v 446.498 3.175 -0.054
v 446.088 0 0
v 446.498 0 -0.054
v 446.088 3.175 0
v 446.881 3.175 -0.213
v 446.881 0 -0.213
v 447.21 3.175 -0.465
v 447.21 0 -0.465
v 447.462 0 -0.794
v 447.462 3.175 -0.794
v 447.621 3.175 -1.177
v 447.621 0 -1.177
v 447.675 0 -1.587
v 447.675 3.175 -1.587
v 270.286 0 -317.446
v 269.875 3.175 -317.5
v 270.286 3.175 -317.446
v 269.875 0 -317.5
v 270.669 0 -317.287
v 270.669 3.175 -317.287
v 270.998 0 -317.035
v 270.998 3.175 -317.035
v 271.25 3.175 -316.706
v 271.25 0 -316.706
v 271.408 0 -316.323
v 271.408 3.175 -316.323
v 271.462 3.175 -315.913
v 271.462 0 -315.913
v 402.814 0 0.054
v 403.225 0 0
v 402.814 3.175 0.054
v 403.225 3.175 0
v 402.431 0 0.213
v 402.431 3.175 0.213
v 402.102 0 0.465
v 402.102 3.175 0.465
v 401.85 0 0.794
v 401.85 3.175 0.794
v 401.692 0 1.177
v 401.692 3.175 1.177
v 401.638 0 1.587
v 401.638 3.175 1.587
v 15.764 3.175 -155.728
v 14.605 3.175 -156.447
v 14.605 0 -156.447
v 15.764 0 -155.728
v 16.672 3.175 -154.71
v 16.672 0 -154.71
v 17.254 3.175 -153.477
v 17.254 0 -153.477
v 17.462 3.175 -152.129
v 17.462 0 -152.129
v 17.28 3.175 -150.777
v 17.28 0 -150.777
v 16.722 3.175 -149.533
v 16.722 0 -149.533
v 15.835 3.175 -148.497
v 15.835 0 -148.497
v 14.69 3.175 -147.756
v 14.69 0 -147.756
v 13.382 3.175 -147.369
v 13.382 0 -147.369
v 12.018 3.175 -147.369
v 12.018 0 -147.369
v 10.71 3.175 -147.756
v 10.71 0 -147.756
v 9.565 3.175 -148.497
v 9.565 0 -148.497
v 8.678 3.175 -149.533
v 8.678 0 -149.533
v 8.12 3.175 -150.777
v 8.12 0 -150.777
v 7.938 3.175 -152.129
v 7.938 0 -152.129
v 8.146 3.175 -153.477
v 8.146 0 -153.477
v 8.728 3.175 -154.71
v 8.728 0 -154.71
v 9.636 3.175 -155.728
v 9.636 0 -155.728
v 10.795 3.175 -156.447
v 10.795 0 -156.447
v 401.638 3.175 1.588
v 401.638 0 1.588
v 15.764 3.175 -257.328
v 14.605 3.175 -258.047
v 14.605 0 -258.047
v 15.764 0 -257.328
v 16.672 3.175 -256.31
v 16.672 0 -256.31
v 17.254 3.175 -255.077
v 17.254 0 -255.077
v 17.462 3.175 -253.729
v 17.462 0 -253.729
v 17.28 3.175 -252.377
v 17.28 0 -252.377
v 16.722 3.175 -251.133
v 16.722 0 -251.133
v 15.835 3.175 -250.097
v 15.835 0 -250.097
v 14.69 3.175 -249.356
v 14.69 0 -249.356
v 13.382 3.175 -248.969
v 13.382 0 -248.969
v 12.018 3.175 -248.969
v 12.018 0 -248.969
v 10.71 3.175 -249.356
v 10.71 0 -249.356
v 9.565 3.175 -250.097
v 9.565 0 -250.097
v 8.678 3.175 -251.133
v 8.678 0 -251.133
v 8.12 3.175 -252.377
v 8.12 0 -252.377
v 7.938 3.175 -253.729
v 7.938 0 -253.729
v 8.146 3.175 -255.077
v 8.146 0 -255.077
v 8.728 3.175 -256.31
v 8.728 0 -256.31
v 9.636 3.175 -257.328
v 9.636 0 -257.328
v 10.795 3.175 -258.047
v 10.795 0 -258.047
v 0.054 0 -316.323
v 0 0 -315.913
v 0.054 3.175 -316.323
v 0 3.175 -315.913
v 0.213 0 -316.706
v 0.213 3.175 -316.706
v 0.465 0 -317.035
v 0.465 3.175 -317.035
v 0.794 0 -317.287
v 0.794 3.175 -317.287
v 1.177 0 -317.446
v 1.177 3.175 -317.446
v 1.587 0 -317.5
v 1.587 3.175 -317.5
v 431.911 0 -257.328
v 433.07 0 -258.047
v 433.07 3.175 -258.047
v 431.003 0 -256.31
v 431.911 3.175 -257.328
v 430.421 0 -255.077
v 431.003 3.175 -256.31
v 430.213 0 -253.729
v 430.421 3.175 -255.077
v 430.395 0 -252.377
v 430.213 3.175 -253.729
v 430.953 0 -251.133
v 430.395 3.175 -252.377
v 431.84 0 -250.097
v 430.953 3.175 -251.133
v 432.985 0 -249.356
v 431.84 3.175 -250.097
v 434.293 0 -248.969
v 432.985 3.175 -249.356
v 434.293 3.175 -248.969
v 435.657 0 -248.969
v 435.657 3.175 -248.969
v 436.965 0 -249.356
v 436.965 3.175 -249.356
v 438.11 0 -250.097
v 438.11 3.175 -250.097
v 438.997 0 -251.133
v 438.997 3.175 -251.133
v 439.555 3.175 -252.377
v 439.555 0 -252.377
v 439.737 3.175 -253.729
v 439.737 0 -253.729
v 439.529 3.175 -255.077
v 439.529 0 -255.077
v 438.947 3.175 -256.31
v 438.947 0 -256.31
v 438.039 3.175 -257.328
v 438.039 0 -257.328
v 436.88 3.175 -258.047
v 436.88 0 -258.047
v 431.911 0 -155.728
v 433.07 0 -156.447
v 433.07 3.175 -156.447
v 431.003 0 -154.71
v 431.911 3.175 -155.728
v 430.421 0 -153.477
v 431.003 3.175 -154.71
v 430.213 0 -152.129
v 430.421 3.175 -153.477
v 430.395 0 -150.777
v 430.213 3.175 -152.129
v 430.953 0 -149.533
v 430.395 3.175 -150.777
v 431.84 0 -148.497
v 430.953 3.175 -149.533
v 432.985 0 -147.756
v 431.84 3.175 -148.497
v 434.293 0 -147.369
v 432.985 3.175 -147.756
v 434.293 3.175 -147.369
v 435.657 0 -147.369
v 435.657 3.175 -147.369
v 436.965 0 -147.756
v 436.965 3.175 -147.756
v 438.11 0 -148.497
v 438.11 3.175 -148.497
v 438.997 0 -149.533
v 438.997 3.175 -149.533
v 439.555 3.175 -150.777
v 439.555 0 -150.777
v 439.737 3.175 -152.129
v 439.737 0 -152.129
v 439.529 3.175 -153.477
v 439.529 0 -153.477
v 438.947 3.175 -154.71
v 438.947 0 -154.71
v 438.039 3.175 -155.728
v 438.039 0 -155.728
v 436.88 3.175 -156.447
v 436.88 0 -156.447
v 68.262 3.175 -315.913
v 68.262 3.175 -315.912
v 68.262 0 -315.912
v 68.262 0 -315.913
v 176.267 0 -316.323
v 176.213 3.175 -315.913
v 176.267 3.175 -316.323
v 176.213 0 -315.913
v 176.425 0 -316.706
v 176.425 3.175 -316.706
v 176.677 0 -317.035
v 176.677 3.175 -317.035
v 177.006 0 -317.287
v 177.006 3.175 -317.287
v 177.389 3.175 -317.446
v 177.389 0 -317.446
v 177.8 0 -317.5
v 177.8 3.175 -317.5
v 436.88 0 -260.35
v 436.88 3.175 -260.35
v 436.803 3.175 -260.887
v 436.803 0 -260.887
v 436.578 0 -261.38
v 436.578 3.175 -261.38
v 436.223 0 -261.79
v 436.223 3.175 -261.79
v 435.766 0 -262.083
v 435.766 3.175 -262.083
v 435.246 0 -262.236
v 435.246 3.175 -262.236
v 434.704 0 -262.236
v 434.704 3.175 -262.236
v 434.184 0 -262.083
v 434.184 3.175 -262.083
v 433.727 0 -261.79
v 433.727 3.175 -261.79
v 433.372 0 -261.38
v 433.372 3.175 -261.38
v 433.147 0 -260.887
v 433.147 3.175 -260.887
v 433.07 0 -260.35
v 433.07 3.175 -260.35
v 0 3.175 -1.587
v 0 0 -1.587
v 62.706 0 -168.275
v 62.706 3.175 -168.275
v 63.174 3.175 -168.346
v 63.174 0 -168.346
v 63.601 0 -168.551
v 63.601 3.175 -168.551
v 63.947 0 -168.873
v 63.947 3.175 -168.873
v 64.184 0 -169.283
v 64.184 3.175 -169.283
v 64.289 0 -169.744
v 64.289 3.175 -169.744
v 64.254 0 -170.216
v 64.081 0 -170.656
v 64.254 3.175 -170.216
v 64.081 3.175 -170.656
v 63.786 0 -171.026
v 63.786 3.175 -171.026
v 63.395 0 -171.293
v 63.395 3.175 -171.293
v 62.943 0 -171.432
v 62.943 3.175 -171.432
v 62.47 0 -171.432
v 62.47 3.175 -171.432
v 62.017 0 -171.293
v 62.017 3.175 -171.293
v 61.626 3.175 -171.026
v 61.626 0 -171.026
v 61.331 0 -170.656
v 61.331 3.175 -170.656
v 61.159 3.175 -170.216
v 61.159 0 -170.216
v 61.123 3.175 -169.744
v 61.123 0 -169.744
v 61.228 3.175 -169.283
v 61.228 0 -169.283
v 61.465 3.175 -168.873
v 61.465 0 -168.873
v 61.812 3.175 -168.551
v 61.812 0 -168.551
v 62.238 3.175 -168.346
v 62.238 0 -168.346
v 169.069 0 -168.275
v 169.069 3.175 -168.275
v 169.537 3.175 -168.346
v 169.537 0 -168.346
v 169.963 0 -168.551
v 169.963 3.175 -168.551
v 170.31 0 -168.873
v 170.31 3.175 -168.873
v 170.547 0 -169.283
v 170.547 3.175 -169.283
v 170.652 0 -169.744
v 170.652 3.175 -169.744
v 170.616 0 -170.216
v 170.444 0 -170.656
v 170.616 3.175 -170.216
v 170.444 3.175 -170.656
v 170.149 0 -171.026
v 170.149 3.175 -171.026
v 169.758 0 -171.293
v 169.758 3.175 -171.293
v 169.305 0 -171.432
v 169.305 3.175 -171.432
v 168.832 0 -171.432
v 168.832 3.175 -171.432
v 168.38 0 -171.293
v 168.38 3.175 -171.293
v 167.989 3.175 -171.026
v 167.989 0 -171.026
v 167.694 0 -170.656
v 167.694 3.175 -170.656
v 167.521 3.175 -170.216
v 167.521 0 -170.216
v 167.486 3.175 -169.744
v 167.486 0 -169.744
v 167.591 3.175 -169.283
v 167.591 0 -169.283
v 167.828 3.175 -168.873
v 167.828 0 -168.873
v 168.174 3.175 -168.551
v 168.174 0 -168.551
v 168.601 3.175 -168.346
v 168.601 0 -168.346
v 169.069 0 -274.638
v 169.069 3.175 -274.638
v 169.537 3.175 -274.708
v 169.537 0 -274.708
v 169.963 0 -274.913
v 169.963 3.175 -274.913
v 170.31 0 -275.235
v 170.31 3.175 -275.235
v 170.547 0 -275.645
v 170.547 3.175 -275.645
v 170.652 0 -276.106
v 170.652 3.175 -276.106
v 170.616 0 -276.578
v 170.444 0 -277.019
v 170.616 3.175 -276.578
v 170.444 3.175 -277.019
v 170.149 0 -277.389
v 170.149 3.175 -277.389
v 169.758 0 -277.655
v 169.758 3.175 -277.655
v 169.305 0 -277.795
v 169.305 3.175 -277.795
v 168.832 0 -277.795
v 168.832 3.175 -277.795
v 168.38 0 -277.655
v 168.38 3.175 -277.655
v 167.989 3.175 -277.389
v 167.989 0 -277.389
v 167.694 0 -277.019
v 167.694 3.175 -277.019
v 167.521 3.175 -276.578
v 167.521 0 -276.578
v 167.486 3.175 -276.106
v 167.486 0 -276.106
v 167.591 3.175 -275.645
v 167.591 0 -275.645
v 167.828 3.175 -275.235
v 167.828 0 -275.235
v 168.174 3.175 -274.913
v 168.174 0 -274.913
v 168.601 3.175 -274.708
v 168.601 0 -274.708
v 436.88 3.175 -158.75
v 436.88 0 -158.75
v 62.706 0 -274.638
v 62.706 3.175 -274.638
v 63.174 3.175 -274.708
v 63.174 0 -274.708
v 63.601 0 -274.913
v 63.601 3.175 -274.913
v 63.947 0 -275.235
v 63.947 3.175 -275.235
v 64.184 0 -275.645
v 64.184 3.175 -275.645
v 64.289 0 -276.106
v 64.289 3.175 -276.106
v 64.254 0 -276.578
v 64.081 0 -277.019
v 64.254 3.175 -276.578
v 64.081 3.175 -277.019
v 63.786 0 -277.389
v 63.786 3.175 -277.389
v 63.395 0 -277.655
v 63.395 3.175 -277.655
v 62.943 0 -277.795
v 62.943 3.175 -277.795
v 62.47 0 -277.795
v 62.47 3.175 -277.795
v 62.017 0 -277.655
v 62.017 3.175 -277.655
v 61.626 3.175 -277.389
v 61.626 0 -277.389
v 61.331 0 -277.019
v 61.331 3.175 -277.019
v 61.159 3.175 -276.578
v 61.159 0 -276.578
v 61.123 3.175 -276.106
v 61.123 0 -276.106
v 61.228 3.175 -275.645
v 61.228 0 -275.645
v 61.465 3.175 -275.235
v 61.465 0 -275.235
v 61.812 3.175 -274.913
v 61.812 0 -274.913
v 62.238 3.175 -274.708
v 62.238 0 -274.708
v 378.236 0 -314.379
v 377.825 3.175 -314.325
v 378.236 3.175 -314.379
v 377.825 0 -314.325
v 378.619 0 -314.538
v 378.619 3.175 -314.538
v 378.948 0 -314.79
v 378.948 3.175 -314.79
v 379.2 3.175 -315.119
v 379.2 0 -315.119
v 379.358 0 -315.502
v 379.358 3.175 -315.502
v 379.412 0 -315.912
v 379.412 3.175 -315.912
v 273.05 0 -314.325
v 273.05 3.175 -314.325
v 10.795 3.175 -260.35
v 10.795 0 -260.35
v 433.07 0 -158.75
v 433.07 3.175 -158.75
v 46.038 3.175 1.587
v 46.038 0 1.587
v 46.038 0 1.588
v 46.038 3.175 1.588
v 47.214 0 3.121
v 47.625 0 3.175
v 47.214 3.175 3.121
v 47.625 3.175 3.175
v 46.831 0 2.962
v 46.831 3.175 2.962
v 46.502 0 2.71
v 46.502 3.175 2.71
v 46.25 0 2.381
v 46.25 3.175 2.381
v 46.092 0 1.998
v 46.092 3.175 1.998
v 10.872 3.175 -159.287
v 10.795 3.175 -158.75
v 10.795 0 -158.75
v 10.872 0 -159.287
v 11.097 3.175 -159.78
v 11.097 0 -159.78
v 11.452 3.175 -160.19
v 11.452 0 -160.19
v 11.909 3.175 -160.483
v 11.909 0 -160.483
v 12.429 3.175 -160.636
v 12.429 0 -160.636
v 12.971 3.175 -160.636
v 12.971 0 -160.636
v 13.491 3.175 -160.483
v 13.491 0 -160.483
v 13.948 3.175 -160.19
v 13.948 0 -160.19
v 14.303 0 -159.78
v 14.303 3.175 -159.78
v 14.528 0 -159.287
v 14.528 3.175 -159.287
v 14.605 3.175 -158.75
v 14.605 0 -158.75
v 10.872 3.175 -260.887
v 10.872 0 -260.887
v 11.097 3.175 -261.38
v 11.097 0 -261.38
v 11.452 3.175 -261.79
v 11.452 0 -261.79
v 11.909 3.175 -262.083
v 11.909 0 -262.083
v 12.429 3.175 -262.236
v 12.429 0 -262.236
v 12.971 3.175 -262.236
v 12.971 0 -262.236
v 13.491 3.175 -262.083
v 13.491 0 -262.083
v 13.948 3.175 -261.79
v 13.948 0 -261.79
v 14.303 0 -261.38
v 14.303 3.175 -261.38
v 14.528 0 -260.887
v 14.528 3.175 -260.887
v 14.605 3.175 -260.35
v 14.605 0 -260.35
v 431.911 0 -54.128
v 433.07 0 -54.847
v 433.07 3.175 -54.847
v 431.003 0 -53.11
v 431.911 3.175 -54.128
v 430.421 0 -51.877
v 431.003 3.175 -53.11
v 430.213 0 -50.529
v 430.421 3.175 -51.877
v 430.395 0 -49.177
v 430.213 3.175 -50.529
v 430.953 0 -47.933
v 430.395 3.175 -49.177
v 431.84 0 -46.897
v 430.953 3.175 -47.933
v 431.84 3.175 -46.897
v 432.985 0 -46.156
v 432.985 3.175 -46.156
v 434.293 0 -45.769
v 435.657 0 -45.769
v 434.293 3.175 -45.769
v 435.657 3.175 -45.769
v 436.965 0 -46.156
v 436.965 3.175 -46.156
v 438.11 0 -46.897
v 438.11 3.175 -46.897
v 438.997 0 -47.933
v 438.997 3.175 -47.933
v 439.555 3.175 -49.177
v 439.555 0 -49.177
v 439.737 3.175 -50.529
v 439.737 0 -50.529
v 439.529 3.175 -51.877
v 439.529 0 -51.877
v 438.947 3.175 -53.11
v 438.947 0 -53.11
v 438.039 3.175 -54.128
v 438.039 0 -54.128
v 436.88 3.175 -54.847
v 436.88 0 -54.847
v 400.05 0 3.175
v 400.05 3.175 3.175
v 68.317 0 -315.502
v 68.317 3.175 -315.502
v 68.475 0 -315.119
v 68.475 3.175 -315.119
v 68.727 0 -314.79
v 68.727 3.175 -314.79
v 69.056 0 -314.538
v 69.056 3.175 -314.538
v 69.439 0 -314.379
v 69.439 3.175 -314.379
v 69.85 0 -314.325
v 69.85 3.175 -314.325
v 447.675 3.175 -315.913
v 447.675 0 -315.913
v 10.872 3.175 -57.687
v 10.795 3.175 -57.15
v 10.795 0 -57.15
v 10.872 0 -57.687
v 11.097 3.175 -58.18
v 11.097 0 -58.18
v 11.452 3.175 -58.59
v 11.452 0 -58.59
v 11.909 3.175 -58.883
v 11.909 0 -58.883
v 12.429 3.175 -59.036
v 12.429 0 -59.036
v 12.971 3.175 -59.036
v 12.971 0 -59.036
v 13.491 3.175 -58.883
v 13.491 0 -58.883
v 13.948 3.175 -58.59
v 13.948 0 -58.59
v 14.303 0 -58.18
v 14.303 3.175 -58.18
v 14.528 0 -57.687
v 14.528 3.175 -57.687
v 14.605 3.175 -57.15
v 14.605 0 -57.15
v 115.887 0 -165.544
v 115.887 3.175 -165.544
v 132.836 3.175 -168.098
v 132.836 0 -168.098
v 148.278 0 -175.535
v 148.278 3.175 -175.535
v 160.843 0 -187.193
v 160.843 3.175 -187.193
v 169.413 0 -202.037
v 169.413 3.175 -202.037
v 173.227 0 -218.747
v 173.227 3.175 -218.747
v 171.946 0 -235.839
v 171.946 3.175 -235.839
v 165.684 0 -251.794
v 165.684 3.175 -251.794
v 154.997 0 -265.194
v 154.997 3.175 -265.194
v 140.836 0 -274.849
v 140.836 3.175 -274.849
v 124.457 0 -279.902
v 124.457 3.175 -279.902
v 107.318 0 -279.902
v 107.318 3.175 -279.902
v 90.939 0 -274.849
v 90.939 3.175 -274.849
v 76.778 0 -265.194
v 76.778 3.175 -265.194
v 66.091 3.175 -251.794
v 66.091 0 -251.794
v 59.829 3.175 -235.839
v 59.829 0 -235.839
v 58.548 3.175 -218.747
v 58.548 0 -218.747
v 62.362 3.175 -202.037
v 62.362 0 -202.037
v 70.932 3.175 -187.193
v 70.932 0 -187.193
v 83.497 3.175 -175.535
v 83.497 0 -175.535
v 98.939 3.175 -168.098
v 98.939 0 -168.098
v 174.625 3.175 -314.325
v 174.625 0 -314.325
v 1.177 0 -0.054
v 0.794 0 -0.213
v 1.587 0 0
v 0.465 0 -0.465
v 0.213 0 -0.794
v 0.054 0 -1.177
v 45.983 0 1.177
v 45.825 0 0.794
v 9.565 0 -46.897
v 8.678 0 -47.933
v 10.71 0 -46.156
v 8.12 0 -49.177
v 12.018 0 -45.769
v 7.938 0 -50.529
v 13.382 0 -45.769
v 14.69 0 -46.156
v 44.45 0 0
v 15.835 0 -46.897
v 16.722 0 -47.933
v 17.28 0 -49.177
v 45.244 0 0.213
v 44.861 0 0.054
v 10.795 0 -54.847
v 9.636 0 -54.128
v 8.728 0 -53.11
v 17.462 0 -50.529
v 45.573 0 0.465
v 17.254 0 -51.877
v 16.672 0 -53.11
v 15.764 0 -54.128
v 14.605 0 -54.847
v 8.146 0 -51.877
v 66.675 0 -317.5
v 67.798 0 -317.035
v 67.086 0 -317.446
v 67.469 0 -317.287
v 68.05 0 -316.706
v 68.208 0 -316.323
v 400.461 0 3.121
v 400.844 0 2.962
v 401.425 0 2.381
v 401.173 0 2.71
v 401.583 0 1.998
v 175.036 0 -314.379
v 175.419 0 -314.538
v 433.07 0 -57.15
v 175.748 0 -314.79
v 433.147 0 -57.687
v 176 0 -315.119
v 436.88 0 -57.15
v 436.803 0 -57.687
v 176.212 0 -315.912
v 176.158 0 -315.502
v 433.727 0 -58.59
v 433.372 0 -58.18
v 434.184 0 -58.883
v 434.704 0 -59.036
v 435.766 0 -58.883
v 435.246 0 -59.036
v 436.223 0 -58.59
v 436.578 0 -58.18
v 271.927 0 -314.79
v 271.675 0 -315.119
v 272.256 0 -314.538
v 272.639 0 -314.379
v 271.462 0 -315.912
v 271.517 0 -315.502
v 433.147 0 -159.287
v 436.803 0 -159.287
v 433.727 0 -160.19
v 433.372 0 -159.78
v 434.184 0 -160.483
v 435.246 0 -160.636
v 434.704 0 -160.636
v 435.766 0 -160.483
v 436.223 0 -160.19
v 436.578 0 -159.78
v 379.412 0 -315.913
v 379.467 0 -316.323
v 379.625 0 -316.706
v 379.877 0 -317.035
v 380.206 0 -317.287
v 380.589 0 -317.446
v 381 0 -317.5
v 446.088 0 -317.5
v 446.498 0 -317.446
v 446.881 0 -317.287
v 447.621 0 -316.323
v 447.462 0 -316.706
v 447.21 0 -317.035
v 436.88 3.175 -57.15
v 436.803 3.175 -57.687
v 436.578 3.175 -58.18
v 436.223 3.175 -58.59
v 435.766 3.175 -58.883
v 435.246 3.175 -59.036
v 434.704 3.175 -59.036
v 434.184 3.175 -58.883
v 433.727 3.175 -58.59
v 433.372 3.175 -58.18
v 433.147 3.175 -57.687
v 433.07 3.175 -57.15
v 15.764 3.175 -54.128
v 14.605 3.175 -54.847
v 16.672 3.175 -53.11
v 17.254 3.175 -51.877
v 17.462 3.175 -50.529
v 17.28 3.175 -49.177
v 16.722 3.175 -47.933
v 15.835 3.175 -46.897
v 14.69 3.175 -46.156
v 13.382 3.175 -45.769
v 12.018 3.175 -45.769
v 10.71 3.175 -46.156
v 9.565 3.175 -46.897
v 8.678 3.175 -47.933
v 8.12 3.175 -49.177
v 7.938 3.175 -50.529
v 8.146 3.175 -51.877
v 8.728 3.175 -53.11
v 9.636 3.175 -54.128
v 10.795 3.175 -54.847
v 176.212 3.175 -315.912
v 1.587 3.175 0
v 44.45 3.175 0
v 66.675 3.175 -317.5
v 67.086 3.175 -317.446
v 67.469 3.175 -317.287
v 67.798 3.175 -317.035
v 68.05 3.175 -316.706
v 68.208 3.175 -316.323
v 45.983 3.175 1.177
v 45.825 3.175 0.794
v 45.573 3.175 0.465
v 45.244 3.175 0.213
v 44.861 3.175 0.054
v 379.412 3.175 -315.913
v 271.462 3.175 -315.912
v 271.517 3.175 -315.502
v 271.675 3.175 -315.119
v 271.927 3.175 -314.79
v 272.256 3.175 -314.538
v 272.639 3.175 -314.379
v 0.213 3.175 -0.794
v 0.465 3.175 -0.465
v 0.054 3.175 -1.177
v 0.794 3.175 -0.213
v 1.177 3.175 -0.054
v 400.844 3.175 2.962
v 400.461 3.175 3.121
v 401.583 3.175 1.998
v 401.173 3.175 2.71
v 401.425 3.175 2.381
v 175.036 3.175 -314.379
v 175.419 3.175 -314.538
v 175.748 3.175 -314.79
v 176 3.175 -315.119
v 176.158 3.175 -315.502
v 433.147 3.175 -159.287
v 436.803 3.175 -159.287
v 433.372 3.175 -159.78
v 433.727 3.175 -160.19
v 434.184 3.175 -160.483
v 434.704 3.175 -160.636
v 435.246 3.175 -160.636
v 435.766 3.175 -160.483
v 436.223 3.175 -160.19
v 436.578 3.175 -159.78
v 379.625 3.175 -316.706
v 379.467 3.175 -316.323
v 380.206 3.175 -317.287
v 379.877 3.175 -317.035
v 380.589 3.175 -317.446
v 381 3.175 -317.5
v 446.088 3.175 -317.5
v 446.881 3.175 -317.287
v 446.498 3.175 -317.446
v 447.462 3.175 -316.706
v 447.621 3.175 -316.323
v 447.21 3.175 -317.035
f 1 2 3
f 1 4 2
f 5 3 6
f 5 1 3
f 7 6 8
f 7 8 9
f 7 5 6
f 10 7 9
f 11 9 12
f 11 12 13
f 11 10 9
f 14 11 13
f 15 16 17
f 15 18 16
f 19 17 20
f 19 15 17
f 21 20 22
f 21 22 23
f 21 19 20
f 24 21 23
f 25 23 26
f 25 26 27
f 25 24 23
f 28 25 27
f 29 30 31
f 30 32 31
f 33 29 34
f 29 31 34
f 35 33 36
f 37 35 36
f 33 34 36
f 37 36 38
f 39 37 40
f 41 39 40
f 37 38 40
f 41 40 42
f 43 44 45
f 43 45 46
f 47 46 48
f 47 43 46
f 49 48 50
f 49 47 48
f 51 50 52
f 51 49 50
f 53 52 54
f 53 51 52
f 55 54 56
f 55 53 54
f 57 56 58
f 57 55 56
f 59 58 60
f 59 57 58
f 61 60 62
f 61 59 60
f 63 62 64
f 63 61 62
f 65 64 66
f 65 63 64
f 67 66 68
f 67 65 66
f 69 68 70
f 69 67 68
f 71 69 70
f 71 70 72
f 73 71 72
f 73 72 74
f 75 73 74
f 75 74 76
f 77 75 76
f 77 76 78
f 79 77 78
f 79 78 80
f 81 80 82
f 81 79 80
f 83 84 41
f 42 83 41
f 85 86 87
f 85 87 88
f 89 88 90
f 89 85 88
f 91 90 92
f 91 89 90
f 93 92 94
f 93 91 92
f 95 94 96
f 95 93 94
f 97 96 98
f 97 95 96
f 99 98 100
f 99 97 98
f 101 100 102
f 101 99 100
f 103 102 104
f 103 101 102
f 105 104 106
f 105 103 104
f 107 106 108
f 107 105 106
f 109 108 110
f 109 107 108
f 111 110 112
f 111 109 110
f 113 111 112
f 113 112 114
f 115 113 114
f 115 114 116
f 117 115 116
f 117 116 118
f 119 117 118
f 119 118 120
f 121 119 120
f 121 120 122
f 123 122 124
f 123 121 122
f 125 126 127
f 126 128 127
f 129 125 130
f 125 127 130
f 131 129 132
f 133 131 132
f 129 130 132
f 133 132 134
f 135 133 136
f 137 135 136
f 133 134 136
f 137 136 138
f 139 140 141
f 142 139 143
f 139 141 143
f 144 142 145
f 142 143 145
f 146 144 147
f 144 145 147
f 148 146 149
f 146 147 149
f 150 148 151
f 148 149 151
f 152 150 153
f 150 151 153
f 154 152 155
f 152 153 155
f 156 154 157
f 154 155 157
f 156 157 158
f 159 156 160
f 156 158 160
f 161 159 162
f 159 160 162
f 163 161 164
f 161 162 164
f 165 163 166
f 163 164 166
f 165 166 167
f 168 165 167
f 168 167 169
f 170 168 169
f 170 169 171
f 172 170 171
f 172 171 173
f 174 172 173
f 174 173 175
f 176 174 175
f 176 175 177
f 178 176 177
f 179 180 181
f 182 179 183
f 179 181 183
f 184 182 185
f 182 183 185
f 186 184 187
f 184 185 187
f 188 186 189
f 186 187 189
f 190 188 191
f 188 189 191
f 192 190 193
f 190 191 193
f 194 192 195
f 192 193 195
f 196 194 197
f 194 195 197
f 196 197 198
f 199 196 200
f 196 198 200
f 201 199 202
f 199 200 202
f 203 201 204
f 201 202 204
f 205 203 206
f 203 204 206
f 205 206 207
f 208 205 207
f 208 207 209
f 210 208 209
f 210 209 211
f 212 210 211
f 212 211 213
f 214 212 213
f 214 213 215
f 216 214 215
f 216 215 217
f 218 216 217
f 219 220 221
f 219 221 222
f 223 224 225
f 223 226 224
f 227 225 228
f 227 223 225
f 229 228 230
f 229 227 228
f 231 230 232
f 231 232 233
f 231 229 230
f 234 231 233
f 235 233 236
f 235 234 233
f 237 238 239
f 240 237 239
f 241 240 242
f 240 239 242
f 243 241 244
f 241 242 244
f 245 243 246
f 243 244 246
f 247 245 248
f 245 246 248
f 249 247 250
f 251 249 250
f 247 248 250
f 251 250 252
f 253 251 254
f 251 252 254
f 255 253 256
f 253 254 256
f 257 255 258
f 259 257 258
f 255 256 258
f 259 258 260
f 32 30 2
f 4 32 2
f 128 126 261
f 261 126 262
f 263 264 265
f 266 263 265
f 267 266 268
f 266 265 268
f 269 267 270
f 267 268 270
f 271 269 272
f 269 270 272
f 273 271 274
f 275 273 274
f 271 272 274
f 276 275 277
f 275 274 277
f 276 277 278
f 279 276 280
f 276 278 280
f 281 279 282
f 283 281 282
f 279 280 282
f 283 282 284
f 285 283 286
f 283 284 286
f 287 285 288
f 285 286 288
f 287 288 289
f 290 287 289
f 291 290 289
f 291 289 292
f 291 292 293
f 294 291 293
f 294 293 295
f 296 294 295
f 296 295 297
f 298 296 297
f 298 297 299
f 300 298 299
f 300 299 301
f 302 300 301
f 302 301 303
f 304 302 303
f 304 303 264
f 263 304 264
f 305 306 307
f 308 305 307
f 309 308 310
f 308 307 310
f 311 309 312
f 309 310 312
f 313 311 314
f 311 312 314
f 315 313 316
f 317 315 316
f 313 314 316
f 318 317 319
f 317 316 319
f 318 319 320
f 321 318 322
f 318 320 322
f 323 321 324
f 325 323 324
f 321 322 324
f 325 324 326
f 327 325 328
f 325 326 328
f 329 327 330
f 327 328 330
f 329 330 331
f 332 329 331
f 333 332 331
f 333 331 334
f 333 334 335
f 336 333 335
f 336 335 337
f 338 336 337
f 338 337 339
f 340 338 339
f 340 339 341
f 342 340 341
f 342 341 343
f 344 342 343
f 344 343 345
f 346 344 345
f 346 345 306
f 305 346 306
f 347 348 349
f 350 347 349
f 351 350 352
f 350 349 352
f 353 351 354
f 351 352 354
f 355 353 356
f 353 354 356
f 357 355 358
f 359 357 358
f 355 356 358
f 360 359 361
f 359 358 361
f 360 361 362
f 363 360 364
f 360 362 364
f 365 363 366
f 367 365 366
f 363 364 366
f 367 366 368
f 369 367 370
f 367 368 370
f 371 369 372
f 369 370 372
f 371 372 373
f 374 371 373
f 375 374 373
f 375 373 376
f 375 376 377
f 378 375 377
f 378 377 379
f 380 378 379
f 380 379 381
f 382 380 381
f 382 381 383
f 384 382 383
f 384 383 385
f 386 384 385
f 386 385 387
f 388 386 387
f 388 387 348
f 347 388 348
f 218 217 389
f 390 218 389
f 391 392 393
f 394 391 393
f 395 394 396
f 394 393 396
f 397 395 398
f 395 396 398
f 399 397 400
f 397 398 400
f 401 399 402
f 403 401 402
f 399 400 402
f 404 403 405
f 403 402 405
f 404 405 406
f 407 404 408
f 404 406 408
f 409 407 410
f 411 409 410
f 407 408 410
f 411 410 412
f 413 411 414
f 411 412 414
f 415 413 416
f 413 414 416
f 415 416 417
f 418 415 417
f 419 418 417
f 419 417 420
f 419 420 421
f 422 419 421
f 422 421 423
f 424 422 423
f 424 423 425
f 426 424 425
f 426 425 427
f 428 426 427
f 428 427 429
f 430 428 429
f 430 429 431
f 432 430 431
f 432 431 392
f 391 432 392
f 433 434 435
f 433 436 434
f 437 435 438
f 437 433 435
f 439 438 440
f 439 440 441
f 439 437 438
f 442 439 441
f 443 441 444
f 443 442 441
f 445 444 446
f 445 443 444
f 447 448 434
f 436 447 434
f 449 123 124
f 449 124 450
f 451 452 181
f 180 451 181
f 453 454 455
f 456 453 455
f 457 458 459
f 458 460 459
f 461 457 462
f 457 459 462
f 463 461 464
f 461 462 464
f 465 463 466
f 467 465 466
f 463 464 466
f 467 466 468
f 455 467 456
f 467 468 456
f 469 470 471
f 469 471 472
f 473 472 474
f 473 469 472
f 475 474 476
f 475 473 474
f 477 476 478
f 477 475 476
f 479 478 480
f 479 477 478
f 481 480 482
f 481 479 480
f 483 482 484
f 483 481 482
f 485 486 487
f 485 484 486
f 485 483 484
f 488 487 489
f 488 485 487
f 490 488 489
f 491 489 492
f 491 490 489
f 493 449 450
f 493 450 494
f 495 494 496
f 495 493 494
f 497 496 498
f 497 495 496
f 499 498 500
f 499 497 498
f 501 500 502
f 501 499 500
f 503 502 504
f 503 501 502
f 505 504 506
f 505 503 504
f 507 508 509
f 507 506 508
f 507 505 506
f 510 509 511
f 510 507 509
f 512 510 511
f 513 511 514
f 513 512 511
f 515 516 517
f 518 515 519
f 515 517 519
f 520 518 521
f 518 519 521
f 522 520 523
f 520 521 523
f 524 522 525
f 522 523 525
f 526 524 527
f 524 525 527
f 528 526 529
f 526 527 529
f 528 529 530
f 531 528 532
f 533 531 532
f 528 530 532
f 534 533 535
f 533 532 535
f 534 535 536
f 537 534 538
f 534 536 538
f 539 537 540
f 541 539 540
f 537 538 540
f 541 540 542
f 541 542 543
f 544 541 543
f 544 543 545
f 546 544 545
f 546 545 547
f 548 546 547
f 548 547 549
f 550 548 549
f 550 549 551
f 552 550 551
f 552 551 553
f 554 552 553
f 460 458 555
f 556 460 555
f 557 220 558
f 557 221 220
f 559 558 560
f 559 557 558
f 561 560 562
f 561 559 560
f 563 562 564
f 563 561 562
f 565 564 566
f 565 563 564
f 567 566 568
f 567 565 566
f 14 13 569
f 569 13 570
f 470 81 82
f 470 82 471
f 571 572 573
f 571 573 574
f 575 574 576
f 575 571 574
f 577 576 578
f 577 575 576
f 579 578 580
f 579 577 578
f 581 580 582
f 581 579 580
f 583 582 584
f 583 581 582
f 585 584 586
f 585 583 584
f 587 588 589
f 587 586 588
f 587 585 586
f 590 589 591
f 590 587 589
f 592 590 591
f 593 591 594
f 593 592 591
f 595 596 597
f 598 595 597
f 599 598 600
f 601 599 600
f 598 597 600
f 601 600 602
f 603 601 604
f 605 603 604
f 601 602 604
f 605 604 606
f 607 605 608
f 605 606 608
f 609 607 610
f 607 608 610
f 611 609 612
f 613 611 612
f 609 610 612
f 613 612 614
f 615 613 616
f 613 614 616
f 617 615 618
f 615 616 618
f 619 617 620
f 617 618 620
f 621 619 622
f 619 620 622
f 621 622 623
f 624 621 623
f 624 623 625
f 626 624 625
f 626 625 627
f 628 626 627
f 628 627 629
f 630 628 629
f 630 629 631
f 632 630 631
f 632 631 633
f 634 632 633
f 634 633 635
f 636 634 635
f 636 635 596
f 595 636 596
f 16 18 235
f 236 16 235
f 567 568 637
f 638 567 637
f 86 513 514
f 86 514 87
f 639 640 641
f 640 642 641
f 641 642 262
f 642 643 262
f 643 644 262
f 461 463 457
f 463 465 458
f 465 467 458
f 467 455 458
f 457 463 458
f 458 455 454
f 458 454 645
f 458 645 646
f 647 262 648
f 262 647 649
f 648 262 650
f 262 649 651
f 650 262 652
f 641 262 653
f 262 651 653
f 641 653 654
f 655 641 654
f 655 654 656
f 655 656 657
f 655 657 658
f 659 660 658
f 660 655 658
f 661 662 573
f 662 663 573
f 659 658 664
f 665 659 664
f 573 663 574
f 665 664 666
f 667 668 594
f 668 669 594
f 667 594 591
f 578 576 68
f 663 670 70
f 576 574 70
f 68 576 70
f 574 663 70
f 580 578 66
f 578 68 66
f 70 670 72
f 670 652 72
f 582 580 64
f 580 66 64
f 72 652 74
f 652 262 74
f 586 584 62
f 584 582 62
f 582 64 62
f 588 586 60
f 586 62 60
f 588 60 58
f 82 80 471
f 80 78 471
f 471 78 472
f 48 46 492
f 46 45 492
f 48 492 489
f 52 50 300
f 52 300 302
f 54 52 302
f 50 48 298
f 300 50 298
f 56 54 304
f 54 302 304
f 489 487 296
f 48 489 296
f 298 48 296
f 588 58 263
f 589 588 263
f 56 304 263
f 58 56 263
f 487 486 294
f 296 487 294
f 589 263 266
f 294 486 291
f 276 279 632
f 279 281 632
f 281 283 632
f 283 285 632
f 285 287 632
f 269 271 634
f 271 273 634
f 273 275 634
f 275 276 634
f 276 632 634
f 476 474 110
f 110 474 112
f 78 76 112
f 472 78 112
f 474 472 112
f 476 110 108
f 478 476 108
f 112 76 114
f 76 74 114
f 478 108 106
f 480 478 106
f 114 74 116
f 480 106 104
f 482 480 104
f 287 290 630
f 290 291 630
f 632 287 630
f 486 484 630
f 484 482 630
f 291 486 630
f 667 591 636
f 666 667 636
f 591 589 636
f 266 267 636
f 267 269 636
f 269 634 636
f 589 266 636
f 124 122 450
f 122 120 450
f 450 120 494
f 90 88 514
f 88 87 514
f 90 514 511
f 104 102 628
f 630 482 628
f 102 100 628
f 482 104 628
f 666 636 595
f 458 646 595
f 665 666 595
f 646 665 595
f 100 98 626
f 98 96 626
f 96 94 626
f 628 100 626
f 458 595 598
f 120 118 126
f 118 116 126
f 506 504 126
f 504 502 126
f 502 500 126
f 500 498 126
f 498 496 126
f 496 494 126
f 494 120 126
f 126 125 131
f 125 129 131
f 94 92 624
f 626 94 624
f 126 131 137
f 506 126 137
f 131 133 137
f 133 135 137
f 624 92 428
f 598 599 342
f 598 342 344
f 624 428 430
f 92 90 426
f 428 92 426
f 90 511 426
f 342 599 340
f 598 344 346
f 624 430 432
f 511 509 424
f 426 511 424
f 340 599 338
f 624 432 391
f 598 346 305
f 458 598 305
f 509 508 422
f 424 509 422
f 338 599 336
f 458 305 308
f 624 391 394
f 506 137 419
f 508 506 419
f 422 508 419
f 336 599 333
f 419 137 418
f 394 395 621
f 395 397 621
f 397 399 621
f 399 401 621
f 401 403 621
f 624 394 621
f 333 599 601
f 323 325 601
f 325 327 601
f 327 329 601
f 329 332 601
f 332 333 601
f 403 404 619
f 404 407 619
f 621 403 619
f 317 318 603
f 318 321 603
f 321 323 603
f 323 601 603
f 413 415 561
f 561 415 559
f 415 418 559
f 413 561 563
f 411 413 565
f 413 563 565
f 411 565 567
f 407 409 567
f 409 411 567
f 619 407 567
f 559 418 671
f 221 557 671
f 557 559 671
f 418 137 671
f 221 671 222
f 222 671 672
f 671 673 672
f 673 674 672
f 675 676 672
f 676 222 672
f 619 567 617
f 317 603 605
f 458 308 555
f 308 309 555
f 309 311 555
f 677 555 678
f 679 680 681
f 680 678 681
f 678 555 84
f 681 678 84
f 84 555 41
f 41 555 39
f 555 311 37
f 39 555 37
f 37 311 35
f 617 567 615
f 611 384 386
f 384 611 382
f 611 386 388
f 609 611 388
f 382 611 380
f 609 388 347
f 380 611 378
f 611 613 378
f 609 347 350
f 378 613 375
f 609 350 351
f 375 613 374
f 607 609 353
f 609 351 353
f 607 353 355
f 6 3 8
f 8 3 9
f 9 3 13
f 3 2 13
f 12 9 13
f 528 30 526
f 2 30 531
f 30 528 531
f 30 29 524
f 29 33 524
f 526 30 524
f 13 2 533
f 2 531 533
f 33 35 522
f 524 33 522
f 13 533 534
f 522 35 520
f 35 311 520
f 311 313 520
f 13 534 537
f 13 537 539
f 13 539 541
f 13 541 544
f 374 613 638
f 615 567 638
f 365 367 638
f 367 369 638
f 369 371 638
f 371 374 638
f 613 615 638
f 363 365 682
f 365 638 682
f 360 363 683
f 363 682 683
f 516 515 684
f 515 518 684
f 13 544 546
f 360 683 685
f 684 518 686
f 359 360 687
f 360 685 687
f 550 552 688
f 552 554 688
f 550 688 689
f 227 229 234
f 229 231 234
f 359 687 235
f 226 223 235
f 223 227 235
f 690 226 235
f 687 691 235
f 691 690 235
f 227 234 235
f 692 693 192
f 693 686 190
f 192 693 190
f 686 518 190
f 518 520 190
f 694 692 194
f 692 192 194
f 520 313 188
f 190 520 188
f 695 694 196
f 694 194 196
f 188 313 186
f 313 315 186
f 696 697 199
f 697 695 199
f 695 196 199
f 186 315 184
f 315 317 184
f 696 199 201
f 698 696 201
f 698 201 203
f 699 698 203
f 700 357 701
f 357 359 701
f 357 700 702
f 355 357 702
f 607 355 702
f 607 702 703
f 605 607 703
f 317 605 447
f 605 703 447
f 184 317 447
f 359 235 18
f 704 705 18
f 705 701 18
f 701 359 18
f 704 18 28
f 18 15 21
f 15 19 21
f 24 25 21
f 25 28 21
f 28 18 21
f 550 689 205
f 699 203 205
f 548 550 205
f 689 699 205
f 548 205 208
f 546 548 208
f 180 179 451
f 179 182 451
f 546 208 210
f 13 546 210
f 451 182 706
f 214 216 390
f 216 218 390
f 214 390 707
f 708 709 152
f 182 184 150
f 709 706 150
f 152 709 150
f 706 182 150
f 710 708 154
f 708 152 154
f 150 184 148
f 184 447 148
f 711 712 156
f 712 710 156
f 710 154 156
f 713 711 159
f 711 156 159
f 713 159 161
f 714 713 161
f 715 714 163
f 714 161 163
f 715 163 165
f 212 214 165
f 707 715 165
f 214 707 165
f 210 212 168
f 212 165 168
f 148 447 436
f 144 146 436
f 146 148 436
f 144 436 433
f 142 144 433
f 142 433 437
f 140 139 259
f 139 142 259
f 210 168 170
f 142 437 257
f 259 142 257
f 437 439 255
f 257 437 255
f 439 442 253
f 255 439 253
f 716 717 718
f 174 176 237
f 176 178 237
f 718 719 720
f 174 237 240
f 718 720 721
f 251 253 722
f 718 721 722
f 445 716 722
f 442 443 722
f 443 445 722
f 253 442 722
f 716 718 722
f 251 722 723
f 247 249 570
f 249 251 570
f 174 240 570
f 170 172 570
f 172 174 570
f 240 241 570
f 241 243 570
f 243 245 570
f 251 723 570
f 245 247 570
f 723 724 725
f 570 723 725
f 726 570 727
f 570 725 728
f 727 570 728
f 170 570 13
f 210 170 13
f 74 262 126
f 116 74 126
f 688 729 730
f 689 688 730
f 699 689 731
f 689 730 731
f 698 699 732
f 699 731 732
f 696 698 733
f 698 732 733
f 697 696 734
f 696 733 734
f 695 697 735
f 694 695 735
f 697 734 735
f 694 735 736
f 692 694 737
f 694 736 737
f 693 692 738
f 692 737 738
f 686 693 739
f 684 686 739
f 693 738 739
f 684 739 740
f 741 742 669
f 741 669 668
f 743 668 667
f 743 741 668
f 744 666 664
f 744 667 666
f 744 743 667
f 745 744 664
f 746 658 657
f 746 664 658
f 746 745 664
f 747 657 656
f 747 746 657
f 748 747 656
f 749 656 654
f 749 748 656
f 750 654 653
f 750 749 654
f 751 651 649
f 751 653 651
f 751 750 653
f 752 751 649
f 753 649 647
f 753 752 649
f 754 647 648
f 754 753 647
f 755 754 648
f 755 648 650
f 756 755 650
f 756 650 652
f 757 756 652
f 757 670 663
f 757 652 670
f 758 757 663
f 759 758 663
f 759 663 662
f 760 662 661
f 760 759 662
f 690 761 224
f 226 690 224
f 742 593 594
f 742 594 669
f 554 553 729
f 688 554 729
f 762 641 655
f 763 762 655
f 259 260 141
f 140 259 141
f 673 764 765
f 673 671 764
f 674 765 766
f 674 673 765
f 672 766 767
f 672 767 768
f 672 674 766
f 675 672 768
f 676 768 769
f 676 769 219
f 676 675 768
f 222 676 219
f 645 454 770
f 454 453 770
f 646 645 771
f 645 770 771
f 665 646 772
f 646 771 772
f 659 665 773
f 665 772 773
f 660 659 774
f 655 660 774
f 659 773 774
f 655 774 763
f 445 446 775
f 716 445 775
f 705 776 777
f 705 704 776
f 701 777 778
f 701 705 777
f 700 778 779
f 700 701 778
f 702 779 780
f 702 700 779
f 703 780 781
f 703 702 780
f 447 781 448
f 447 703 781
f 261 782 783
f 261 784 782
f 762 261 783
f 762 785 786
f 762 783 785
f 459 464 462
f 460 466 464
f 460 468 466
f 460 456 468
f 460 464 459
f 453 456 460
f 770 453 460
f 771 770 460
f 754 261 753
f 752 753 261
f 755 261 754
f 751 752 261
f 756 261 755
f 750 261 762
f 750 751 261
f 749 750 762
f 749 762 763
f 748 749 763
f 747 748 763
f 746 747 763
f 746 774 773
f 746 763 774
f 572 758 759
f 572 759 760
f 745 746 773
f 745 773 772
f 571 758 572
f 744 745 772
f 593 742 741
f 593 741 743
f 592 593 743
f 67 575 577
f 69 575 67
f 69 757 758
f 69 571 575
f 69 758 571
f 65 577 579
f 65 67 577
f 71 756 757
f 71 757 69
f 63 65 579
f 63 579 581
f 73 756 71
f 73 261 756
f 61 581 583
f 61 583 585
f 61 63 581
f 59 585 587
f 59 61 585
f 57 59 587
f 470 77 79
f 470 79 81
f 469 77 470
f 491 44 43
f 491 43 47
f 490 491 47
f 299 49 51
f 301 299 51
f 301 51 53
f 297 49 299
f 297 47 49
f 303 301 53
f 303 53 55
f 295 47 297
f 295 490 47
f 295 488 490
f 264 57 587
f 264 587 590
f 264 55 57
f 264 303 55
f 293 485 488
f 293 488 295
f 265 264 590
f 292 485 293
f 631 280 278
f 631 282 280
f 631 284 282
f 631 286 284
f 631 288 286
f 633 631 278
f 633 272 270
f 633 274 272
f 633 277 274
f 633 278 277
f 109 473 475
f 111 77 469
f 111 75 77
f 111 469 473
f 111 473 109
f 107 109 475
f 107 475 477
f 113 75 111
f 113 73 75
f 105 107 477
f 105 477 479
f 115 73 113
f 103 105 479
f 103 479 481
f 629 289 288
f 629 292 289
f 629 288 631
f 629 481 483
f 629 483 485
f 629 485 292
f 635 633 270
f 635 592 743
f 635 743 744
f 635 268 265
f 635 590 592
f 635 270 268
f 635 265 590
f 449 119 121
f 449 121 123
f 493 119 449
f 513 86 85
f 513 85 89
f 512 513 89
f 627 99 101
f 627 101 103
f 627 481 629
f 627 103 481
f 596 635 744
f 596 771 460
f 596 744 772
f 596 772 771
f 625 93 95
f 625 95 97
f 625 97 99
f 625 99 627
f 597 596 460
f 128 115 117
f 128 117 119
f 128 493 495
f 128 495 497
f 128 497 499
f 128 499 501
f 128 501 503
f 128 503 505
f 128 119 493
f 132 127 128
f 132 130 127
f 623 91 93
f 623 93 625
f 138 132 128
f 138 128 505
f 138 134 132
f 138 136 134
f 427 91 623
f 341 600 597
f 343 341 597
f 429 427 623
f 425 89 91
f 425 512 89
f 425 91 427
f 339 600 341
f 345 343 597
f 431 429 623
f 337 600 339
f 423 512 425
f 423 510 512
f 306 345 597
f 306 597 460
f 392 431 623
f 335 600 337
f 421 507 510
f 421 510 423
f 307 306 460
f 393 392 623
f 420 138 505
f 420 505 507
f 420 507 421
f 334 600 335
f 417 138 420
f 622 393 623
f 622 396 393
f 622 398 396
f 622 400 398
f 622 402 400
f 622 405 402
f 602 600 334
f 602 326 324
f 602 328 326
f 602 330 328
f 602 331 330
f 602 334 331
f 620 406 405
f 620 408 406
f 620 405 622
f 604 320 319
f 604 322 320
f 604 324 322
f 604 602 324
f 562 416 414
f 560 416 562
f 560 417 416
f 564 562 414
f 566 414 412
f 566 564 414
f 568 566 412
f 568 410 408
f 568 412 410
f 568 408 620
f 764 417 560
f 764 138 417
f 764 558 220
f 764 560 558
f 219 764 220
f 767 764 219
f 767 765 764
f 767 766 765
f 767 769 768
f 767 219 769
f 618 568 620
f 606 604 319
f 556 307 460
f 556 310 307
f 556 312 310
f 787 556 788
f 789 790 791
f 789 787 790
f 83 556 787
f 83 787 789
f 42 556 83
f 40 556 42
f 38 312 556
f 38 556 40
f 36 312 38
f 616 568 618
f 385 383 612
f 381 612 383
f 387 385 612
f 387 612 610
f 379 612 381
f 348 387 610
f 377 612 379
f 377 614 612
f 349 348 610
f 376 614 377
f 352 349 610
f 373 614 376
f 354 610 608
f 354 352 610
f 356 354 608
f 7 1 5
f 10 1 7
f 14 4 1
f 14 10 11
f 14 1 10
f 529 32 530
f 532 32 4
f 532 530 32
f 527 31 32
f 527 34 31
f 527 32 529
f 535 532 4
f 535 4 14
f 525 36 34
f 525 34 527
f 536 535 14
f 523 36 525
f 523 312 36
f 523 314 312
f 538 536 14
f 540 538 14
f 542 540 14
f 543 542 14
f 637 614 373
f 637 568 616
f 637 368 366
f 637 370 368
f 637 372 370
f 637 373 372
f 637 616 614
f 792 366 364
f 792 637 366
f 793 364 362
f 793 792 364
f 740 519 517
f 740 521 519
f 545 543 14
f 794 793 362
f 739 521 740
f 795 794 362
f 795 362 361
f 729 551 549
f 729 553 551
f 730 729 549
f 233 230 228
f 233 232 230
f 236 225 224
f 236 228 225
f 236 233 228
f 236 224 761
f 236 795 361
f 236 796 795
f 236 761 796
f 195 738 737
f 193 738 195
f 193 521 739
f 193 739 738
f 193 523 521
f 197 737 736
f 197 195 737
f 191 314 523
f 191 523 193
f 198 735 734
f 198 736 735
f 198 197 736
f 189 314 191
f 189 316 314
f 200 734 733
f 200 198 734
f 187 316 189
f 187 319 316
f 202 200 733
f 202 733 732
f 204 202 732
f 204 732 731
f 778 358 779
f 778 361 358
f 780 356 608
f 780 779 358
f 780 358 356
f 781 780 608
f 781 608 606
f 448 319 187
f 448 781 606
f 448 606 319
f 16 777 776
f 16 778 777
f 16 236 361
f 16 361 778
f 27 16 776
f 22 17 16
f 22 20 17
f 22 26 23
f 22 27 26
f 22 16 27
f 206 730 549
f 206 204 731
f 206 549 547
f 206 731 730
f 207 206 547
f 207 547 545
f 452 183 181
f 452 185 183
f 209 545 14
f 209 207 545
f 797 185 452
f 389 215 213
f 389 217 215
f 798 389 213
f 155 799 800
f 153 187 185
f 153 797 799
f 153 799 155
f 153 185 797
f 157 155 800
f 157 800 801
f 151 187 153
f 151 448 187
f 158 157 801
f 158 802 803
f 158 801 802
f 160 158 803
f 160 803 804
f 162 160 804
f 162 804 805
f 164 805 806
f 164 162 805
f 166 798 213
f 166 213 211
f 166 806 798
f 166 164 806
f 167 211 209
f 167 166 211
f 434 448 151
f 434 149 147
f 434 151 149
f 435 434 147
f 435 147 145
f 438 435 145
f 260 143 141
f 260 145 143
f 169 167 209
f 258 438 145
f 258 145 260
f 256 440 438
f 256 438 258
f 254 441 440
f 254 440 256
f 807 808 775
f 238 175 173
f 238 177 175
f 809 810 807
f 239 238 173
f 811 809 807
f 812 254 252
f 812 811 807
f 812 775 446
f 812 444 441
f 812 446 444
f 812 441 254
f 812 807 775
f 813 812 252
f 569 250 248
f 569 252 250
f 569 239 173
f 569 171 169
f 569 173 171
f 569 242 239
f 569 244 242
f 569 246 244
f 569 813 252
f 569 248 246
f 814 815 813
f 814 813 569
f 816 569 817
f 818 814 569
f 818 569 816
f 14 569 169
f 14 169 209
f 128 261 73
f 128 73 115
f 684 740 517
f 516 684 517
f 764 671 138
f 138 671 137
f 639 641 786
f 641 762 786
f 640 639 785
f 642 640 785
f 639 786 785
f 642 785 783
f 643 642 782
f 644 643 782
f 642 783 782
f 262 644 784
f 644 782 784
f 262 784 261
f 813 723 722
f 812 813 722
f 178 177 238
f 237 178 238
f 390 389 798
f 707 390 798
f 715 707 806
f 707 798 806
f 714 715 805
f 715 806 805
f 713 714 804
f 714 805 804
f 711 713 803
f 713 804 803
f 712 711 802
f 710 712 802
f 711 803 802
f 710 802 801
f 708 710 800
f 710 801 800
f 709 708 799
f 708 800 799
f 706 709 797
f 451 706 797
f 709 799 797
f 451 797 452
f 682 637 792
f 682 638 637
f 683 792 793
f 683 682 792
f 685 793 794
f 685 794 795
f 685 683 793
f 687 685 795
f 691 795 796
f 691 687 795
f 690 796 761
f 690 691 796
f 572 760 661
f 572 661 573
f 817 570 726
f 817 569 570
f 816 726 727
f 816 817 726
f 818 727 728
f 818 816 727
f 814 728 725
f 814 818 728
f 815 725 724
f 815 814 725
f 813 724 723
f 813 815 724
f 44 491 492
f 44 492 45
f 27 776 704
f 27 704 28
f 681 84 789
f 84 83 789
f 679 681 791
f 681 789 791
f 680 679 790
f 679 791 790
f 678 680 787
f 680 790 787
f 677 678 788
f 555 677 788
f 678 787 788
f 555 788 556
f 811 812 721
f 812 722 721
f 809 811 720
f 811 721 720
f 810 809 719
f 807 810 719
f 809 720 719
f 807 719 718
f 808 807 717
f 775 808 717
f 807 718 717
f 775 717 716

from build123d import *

# Parameters (mm, degrees)
BOSS_EXTRUDE1_DEPTH  = 3.175
SKETCH3_W            = 107.95
SKETCH3_H            = 3.175
CUT_EXTRUDE2_DEPTH   = 549.843544419
FILLET1_R            = 1.5875
CUT_EXTRUDE1_DEPTH   = 549.843544419
LPATTERN1_COUNT      = 3
LPATTERN1_PITCH      = 101.6
MIRROR1_COPY_1_DEPTH = 549.843544419
MIRROR1_COPY_2_DEPTH = 549.843544419
SKETCH4_R            = 1.5875
SKETCH4_R_2          = 57.5
CUT_EXTRUDE3_DEPTH   = 549.843544419


with BuildPart() as part:
    # Sketch1 → Boss-Extrude1 (new body)
    with BuildSketch(Plane(origin=(0, 0, 0), x_dir=(1, 0, 0), z_dir=(0, 1, 0))):
        Polygon((401.6375, 0), (447.675, 0), (447.675, 317.5), (0, 317.5), (0, 0), (46.0375, 0), (46.0375, -3.175), (401.6375, -3.175), align=None)
    extrude(amount=BOSS_EXTRUDE1_DEPTH)

    # Sketch3 → Cut-Extrude2 (cut, through all)
    with BuildSketch(Plane(origin=(0, 3.175, 0), x_dir=(1, 0, 0), z_dir=(0, 1, 0))):
        with Locations((122.2375, 315.9125)):
            Rectangle(SKETCH3_W, SKETCH3_H)
        with Locations((325.4375, 315.9125)):
            Rectangle(SKETCH3_W, SKETCH3_H)
    extrude(amount=-CUT_EXTRUDE2_DEPTH, mode=Mode.SUBTRACT)

    # Fillet1
    fillet1_edges = [part.edges().sort_by_distance(p)[0] for p in [
        (379.4125, 1.5875, -317.5),
        (271.4625, 1.5875, -317.5),
        (176.2125, 1.5875, -317.5),
        (68.2625, 1.5875, -317.5),
        (379.4125, 1.5875, -314.325),
        (271.4625, 1.5875, -314.325),
        (176.2125, 1.5875, -314.325),
        (68.2625, 1.5875, -314.325),
        (447.675, 1.5875, -317.5),
        (447.675, 1.5875, 0),
        (0, 1.5875, 0),
        (0, 1.5875, -317.5),
        (401.6375, 1.5875, 3.175),
        (401.6375, 1.5875, 0),
        (46.0375, 1.5875, 3.175),
        (46.0375, 1.5875, 0),
    ]]
    fillet(fillet1_edges, radius=FILLET1_R - 0.0001)  # a hair under: the kernel refuses the full size

    # Sketch2 → Cut-Extrude1 (cut, through all)
    with BuildSketch(Plane(origin=(0, 3.175, 0), x_dir=(1, 0, 0), z_dir=(0, 1, 0))):
        with BuildLine():
            Line((10.795, 258.047403349), (10.795, 260.35))
            ThreePointArc((10.795, 260.35), (12.7, 262.255), (14.605, 260.35))
            Line((14.605, 260.35), (14.605, 258.047403349))
            ThreePointArc((14.605, 258.047403349), (12.7, 248.92), (10.795, 258.047403349))
        make_face()
    cut_extrude1 = extrude(amount=-CUT_EXTRUDE1_DEPTH, mode=Mode.SUBTRACT)

    # LPattern1: Cut-Extrude1 ×3
    with Locations(*[(0, 0, i * LPATTERN1_PITCH) for i in range(1, LPATTERN1_COUNT)]):
        add(cut_extrude1, mode=Mode.SUBTRACT)

    # Mirror1: Cut-Extrude1 across plane
    add(cut_extrude1.mirror(Plane.ZY.offset(-223.8375)), mode=Mode.SUBTRACT)

    # Mirror1 copy 1 sketch → Mirror1 copy 1 (cut, through all)
    with BuildSketch(Plane(origin=(447.675, 3.175, 101.6), x_dir=(-1, 0, 0), z_dir=(0, 1, 0))):
        with BuildLine():
            Line((10.795, -258.047403349), (10.795, -260.35))
            ThreePointArc((10.795, -260.35), (12.7, -262.255), (14.605, -260.35))
            Line((14.605, -260.35), (14.605, -258.047403349))
            ThreePointArc((14.605, -258.047403349), (12.7, -248.92), (10.795, -258.047403349))
        make_face()
    extrude(amount=-MIRROR1_COPY_1_DEPTH, mode=Mode.SUBTRACT)

    # Mirror1 copy 2 sketch → Mirror1 copy 2 (cut, through all)
    with BuildSketch(Plane(origin=(447.675, 3.175, 203.2), x_dir=(-1, 0, 0), z_dir=(0, 1, 0))):
        with BuildLine():
            Line((10.795, -258.047403349), (10.795, -260.35))
            ThreePointArc((10.795, -260.35), (12.7, -262.255), (14.605, -260.35))
            Line((14.605, -260.35), (14.605, -258.047403349))
            ThreePointArc((14.605, -258.047403349), (12.7, -248.92), (10.795, -258.047403349))
        make_face()
    extrude(amount=-MIRROR1_COPY_2_DEPTH, mode=Mode.SUBTRACT)

    # Sketch4 → Cut-Extrude3 (cut, through all)
    with BuildSketch(Plane(origin=(0, 3.175, 0), x_dir=(1, 0, 0), z_dir=(0, 1, 0))):
        with Locations(Location((62.70625, 276.225, 0), (0, 0, 270))):
            Circle(SKETCH4_R)
        with Locations(Location((169.06875, 276.225, 0), (0, 0, 270))):
            Circle(SKETCH4_R)
        with Locations(Location((169.06875, 169.8625, 0), (0, 0, 270))):
            Circle(SKETCH4_R)
        with Locations(Location((62.70625, 169.8625, 0), (0, 0, 270))):
            Circle(SKETCH4_R)
        with Locations(Location((115.8875, 223.04375, 0), (0, 0, 270))):
            Circle(SKETCH4_R_2)
    extrude(amount=-CUT_EXTRUDE3_DEPTH, mode=Mode.SUBTRACT)


solid = part.part
